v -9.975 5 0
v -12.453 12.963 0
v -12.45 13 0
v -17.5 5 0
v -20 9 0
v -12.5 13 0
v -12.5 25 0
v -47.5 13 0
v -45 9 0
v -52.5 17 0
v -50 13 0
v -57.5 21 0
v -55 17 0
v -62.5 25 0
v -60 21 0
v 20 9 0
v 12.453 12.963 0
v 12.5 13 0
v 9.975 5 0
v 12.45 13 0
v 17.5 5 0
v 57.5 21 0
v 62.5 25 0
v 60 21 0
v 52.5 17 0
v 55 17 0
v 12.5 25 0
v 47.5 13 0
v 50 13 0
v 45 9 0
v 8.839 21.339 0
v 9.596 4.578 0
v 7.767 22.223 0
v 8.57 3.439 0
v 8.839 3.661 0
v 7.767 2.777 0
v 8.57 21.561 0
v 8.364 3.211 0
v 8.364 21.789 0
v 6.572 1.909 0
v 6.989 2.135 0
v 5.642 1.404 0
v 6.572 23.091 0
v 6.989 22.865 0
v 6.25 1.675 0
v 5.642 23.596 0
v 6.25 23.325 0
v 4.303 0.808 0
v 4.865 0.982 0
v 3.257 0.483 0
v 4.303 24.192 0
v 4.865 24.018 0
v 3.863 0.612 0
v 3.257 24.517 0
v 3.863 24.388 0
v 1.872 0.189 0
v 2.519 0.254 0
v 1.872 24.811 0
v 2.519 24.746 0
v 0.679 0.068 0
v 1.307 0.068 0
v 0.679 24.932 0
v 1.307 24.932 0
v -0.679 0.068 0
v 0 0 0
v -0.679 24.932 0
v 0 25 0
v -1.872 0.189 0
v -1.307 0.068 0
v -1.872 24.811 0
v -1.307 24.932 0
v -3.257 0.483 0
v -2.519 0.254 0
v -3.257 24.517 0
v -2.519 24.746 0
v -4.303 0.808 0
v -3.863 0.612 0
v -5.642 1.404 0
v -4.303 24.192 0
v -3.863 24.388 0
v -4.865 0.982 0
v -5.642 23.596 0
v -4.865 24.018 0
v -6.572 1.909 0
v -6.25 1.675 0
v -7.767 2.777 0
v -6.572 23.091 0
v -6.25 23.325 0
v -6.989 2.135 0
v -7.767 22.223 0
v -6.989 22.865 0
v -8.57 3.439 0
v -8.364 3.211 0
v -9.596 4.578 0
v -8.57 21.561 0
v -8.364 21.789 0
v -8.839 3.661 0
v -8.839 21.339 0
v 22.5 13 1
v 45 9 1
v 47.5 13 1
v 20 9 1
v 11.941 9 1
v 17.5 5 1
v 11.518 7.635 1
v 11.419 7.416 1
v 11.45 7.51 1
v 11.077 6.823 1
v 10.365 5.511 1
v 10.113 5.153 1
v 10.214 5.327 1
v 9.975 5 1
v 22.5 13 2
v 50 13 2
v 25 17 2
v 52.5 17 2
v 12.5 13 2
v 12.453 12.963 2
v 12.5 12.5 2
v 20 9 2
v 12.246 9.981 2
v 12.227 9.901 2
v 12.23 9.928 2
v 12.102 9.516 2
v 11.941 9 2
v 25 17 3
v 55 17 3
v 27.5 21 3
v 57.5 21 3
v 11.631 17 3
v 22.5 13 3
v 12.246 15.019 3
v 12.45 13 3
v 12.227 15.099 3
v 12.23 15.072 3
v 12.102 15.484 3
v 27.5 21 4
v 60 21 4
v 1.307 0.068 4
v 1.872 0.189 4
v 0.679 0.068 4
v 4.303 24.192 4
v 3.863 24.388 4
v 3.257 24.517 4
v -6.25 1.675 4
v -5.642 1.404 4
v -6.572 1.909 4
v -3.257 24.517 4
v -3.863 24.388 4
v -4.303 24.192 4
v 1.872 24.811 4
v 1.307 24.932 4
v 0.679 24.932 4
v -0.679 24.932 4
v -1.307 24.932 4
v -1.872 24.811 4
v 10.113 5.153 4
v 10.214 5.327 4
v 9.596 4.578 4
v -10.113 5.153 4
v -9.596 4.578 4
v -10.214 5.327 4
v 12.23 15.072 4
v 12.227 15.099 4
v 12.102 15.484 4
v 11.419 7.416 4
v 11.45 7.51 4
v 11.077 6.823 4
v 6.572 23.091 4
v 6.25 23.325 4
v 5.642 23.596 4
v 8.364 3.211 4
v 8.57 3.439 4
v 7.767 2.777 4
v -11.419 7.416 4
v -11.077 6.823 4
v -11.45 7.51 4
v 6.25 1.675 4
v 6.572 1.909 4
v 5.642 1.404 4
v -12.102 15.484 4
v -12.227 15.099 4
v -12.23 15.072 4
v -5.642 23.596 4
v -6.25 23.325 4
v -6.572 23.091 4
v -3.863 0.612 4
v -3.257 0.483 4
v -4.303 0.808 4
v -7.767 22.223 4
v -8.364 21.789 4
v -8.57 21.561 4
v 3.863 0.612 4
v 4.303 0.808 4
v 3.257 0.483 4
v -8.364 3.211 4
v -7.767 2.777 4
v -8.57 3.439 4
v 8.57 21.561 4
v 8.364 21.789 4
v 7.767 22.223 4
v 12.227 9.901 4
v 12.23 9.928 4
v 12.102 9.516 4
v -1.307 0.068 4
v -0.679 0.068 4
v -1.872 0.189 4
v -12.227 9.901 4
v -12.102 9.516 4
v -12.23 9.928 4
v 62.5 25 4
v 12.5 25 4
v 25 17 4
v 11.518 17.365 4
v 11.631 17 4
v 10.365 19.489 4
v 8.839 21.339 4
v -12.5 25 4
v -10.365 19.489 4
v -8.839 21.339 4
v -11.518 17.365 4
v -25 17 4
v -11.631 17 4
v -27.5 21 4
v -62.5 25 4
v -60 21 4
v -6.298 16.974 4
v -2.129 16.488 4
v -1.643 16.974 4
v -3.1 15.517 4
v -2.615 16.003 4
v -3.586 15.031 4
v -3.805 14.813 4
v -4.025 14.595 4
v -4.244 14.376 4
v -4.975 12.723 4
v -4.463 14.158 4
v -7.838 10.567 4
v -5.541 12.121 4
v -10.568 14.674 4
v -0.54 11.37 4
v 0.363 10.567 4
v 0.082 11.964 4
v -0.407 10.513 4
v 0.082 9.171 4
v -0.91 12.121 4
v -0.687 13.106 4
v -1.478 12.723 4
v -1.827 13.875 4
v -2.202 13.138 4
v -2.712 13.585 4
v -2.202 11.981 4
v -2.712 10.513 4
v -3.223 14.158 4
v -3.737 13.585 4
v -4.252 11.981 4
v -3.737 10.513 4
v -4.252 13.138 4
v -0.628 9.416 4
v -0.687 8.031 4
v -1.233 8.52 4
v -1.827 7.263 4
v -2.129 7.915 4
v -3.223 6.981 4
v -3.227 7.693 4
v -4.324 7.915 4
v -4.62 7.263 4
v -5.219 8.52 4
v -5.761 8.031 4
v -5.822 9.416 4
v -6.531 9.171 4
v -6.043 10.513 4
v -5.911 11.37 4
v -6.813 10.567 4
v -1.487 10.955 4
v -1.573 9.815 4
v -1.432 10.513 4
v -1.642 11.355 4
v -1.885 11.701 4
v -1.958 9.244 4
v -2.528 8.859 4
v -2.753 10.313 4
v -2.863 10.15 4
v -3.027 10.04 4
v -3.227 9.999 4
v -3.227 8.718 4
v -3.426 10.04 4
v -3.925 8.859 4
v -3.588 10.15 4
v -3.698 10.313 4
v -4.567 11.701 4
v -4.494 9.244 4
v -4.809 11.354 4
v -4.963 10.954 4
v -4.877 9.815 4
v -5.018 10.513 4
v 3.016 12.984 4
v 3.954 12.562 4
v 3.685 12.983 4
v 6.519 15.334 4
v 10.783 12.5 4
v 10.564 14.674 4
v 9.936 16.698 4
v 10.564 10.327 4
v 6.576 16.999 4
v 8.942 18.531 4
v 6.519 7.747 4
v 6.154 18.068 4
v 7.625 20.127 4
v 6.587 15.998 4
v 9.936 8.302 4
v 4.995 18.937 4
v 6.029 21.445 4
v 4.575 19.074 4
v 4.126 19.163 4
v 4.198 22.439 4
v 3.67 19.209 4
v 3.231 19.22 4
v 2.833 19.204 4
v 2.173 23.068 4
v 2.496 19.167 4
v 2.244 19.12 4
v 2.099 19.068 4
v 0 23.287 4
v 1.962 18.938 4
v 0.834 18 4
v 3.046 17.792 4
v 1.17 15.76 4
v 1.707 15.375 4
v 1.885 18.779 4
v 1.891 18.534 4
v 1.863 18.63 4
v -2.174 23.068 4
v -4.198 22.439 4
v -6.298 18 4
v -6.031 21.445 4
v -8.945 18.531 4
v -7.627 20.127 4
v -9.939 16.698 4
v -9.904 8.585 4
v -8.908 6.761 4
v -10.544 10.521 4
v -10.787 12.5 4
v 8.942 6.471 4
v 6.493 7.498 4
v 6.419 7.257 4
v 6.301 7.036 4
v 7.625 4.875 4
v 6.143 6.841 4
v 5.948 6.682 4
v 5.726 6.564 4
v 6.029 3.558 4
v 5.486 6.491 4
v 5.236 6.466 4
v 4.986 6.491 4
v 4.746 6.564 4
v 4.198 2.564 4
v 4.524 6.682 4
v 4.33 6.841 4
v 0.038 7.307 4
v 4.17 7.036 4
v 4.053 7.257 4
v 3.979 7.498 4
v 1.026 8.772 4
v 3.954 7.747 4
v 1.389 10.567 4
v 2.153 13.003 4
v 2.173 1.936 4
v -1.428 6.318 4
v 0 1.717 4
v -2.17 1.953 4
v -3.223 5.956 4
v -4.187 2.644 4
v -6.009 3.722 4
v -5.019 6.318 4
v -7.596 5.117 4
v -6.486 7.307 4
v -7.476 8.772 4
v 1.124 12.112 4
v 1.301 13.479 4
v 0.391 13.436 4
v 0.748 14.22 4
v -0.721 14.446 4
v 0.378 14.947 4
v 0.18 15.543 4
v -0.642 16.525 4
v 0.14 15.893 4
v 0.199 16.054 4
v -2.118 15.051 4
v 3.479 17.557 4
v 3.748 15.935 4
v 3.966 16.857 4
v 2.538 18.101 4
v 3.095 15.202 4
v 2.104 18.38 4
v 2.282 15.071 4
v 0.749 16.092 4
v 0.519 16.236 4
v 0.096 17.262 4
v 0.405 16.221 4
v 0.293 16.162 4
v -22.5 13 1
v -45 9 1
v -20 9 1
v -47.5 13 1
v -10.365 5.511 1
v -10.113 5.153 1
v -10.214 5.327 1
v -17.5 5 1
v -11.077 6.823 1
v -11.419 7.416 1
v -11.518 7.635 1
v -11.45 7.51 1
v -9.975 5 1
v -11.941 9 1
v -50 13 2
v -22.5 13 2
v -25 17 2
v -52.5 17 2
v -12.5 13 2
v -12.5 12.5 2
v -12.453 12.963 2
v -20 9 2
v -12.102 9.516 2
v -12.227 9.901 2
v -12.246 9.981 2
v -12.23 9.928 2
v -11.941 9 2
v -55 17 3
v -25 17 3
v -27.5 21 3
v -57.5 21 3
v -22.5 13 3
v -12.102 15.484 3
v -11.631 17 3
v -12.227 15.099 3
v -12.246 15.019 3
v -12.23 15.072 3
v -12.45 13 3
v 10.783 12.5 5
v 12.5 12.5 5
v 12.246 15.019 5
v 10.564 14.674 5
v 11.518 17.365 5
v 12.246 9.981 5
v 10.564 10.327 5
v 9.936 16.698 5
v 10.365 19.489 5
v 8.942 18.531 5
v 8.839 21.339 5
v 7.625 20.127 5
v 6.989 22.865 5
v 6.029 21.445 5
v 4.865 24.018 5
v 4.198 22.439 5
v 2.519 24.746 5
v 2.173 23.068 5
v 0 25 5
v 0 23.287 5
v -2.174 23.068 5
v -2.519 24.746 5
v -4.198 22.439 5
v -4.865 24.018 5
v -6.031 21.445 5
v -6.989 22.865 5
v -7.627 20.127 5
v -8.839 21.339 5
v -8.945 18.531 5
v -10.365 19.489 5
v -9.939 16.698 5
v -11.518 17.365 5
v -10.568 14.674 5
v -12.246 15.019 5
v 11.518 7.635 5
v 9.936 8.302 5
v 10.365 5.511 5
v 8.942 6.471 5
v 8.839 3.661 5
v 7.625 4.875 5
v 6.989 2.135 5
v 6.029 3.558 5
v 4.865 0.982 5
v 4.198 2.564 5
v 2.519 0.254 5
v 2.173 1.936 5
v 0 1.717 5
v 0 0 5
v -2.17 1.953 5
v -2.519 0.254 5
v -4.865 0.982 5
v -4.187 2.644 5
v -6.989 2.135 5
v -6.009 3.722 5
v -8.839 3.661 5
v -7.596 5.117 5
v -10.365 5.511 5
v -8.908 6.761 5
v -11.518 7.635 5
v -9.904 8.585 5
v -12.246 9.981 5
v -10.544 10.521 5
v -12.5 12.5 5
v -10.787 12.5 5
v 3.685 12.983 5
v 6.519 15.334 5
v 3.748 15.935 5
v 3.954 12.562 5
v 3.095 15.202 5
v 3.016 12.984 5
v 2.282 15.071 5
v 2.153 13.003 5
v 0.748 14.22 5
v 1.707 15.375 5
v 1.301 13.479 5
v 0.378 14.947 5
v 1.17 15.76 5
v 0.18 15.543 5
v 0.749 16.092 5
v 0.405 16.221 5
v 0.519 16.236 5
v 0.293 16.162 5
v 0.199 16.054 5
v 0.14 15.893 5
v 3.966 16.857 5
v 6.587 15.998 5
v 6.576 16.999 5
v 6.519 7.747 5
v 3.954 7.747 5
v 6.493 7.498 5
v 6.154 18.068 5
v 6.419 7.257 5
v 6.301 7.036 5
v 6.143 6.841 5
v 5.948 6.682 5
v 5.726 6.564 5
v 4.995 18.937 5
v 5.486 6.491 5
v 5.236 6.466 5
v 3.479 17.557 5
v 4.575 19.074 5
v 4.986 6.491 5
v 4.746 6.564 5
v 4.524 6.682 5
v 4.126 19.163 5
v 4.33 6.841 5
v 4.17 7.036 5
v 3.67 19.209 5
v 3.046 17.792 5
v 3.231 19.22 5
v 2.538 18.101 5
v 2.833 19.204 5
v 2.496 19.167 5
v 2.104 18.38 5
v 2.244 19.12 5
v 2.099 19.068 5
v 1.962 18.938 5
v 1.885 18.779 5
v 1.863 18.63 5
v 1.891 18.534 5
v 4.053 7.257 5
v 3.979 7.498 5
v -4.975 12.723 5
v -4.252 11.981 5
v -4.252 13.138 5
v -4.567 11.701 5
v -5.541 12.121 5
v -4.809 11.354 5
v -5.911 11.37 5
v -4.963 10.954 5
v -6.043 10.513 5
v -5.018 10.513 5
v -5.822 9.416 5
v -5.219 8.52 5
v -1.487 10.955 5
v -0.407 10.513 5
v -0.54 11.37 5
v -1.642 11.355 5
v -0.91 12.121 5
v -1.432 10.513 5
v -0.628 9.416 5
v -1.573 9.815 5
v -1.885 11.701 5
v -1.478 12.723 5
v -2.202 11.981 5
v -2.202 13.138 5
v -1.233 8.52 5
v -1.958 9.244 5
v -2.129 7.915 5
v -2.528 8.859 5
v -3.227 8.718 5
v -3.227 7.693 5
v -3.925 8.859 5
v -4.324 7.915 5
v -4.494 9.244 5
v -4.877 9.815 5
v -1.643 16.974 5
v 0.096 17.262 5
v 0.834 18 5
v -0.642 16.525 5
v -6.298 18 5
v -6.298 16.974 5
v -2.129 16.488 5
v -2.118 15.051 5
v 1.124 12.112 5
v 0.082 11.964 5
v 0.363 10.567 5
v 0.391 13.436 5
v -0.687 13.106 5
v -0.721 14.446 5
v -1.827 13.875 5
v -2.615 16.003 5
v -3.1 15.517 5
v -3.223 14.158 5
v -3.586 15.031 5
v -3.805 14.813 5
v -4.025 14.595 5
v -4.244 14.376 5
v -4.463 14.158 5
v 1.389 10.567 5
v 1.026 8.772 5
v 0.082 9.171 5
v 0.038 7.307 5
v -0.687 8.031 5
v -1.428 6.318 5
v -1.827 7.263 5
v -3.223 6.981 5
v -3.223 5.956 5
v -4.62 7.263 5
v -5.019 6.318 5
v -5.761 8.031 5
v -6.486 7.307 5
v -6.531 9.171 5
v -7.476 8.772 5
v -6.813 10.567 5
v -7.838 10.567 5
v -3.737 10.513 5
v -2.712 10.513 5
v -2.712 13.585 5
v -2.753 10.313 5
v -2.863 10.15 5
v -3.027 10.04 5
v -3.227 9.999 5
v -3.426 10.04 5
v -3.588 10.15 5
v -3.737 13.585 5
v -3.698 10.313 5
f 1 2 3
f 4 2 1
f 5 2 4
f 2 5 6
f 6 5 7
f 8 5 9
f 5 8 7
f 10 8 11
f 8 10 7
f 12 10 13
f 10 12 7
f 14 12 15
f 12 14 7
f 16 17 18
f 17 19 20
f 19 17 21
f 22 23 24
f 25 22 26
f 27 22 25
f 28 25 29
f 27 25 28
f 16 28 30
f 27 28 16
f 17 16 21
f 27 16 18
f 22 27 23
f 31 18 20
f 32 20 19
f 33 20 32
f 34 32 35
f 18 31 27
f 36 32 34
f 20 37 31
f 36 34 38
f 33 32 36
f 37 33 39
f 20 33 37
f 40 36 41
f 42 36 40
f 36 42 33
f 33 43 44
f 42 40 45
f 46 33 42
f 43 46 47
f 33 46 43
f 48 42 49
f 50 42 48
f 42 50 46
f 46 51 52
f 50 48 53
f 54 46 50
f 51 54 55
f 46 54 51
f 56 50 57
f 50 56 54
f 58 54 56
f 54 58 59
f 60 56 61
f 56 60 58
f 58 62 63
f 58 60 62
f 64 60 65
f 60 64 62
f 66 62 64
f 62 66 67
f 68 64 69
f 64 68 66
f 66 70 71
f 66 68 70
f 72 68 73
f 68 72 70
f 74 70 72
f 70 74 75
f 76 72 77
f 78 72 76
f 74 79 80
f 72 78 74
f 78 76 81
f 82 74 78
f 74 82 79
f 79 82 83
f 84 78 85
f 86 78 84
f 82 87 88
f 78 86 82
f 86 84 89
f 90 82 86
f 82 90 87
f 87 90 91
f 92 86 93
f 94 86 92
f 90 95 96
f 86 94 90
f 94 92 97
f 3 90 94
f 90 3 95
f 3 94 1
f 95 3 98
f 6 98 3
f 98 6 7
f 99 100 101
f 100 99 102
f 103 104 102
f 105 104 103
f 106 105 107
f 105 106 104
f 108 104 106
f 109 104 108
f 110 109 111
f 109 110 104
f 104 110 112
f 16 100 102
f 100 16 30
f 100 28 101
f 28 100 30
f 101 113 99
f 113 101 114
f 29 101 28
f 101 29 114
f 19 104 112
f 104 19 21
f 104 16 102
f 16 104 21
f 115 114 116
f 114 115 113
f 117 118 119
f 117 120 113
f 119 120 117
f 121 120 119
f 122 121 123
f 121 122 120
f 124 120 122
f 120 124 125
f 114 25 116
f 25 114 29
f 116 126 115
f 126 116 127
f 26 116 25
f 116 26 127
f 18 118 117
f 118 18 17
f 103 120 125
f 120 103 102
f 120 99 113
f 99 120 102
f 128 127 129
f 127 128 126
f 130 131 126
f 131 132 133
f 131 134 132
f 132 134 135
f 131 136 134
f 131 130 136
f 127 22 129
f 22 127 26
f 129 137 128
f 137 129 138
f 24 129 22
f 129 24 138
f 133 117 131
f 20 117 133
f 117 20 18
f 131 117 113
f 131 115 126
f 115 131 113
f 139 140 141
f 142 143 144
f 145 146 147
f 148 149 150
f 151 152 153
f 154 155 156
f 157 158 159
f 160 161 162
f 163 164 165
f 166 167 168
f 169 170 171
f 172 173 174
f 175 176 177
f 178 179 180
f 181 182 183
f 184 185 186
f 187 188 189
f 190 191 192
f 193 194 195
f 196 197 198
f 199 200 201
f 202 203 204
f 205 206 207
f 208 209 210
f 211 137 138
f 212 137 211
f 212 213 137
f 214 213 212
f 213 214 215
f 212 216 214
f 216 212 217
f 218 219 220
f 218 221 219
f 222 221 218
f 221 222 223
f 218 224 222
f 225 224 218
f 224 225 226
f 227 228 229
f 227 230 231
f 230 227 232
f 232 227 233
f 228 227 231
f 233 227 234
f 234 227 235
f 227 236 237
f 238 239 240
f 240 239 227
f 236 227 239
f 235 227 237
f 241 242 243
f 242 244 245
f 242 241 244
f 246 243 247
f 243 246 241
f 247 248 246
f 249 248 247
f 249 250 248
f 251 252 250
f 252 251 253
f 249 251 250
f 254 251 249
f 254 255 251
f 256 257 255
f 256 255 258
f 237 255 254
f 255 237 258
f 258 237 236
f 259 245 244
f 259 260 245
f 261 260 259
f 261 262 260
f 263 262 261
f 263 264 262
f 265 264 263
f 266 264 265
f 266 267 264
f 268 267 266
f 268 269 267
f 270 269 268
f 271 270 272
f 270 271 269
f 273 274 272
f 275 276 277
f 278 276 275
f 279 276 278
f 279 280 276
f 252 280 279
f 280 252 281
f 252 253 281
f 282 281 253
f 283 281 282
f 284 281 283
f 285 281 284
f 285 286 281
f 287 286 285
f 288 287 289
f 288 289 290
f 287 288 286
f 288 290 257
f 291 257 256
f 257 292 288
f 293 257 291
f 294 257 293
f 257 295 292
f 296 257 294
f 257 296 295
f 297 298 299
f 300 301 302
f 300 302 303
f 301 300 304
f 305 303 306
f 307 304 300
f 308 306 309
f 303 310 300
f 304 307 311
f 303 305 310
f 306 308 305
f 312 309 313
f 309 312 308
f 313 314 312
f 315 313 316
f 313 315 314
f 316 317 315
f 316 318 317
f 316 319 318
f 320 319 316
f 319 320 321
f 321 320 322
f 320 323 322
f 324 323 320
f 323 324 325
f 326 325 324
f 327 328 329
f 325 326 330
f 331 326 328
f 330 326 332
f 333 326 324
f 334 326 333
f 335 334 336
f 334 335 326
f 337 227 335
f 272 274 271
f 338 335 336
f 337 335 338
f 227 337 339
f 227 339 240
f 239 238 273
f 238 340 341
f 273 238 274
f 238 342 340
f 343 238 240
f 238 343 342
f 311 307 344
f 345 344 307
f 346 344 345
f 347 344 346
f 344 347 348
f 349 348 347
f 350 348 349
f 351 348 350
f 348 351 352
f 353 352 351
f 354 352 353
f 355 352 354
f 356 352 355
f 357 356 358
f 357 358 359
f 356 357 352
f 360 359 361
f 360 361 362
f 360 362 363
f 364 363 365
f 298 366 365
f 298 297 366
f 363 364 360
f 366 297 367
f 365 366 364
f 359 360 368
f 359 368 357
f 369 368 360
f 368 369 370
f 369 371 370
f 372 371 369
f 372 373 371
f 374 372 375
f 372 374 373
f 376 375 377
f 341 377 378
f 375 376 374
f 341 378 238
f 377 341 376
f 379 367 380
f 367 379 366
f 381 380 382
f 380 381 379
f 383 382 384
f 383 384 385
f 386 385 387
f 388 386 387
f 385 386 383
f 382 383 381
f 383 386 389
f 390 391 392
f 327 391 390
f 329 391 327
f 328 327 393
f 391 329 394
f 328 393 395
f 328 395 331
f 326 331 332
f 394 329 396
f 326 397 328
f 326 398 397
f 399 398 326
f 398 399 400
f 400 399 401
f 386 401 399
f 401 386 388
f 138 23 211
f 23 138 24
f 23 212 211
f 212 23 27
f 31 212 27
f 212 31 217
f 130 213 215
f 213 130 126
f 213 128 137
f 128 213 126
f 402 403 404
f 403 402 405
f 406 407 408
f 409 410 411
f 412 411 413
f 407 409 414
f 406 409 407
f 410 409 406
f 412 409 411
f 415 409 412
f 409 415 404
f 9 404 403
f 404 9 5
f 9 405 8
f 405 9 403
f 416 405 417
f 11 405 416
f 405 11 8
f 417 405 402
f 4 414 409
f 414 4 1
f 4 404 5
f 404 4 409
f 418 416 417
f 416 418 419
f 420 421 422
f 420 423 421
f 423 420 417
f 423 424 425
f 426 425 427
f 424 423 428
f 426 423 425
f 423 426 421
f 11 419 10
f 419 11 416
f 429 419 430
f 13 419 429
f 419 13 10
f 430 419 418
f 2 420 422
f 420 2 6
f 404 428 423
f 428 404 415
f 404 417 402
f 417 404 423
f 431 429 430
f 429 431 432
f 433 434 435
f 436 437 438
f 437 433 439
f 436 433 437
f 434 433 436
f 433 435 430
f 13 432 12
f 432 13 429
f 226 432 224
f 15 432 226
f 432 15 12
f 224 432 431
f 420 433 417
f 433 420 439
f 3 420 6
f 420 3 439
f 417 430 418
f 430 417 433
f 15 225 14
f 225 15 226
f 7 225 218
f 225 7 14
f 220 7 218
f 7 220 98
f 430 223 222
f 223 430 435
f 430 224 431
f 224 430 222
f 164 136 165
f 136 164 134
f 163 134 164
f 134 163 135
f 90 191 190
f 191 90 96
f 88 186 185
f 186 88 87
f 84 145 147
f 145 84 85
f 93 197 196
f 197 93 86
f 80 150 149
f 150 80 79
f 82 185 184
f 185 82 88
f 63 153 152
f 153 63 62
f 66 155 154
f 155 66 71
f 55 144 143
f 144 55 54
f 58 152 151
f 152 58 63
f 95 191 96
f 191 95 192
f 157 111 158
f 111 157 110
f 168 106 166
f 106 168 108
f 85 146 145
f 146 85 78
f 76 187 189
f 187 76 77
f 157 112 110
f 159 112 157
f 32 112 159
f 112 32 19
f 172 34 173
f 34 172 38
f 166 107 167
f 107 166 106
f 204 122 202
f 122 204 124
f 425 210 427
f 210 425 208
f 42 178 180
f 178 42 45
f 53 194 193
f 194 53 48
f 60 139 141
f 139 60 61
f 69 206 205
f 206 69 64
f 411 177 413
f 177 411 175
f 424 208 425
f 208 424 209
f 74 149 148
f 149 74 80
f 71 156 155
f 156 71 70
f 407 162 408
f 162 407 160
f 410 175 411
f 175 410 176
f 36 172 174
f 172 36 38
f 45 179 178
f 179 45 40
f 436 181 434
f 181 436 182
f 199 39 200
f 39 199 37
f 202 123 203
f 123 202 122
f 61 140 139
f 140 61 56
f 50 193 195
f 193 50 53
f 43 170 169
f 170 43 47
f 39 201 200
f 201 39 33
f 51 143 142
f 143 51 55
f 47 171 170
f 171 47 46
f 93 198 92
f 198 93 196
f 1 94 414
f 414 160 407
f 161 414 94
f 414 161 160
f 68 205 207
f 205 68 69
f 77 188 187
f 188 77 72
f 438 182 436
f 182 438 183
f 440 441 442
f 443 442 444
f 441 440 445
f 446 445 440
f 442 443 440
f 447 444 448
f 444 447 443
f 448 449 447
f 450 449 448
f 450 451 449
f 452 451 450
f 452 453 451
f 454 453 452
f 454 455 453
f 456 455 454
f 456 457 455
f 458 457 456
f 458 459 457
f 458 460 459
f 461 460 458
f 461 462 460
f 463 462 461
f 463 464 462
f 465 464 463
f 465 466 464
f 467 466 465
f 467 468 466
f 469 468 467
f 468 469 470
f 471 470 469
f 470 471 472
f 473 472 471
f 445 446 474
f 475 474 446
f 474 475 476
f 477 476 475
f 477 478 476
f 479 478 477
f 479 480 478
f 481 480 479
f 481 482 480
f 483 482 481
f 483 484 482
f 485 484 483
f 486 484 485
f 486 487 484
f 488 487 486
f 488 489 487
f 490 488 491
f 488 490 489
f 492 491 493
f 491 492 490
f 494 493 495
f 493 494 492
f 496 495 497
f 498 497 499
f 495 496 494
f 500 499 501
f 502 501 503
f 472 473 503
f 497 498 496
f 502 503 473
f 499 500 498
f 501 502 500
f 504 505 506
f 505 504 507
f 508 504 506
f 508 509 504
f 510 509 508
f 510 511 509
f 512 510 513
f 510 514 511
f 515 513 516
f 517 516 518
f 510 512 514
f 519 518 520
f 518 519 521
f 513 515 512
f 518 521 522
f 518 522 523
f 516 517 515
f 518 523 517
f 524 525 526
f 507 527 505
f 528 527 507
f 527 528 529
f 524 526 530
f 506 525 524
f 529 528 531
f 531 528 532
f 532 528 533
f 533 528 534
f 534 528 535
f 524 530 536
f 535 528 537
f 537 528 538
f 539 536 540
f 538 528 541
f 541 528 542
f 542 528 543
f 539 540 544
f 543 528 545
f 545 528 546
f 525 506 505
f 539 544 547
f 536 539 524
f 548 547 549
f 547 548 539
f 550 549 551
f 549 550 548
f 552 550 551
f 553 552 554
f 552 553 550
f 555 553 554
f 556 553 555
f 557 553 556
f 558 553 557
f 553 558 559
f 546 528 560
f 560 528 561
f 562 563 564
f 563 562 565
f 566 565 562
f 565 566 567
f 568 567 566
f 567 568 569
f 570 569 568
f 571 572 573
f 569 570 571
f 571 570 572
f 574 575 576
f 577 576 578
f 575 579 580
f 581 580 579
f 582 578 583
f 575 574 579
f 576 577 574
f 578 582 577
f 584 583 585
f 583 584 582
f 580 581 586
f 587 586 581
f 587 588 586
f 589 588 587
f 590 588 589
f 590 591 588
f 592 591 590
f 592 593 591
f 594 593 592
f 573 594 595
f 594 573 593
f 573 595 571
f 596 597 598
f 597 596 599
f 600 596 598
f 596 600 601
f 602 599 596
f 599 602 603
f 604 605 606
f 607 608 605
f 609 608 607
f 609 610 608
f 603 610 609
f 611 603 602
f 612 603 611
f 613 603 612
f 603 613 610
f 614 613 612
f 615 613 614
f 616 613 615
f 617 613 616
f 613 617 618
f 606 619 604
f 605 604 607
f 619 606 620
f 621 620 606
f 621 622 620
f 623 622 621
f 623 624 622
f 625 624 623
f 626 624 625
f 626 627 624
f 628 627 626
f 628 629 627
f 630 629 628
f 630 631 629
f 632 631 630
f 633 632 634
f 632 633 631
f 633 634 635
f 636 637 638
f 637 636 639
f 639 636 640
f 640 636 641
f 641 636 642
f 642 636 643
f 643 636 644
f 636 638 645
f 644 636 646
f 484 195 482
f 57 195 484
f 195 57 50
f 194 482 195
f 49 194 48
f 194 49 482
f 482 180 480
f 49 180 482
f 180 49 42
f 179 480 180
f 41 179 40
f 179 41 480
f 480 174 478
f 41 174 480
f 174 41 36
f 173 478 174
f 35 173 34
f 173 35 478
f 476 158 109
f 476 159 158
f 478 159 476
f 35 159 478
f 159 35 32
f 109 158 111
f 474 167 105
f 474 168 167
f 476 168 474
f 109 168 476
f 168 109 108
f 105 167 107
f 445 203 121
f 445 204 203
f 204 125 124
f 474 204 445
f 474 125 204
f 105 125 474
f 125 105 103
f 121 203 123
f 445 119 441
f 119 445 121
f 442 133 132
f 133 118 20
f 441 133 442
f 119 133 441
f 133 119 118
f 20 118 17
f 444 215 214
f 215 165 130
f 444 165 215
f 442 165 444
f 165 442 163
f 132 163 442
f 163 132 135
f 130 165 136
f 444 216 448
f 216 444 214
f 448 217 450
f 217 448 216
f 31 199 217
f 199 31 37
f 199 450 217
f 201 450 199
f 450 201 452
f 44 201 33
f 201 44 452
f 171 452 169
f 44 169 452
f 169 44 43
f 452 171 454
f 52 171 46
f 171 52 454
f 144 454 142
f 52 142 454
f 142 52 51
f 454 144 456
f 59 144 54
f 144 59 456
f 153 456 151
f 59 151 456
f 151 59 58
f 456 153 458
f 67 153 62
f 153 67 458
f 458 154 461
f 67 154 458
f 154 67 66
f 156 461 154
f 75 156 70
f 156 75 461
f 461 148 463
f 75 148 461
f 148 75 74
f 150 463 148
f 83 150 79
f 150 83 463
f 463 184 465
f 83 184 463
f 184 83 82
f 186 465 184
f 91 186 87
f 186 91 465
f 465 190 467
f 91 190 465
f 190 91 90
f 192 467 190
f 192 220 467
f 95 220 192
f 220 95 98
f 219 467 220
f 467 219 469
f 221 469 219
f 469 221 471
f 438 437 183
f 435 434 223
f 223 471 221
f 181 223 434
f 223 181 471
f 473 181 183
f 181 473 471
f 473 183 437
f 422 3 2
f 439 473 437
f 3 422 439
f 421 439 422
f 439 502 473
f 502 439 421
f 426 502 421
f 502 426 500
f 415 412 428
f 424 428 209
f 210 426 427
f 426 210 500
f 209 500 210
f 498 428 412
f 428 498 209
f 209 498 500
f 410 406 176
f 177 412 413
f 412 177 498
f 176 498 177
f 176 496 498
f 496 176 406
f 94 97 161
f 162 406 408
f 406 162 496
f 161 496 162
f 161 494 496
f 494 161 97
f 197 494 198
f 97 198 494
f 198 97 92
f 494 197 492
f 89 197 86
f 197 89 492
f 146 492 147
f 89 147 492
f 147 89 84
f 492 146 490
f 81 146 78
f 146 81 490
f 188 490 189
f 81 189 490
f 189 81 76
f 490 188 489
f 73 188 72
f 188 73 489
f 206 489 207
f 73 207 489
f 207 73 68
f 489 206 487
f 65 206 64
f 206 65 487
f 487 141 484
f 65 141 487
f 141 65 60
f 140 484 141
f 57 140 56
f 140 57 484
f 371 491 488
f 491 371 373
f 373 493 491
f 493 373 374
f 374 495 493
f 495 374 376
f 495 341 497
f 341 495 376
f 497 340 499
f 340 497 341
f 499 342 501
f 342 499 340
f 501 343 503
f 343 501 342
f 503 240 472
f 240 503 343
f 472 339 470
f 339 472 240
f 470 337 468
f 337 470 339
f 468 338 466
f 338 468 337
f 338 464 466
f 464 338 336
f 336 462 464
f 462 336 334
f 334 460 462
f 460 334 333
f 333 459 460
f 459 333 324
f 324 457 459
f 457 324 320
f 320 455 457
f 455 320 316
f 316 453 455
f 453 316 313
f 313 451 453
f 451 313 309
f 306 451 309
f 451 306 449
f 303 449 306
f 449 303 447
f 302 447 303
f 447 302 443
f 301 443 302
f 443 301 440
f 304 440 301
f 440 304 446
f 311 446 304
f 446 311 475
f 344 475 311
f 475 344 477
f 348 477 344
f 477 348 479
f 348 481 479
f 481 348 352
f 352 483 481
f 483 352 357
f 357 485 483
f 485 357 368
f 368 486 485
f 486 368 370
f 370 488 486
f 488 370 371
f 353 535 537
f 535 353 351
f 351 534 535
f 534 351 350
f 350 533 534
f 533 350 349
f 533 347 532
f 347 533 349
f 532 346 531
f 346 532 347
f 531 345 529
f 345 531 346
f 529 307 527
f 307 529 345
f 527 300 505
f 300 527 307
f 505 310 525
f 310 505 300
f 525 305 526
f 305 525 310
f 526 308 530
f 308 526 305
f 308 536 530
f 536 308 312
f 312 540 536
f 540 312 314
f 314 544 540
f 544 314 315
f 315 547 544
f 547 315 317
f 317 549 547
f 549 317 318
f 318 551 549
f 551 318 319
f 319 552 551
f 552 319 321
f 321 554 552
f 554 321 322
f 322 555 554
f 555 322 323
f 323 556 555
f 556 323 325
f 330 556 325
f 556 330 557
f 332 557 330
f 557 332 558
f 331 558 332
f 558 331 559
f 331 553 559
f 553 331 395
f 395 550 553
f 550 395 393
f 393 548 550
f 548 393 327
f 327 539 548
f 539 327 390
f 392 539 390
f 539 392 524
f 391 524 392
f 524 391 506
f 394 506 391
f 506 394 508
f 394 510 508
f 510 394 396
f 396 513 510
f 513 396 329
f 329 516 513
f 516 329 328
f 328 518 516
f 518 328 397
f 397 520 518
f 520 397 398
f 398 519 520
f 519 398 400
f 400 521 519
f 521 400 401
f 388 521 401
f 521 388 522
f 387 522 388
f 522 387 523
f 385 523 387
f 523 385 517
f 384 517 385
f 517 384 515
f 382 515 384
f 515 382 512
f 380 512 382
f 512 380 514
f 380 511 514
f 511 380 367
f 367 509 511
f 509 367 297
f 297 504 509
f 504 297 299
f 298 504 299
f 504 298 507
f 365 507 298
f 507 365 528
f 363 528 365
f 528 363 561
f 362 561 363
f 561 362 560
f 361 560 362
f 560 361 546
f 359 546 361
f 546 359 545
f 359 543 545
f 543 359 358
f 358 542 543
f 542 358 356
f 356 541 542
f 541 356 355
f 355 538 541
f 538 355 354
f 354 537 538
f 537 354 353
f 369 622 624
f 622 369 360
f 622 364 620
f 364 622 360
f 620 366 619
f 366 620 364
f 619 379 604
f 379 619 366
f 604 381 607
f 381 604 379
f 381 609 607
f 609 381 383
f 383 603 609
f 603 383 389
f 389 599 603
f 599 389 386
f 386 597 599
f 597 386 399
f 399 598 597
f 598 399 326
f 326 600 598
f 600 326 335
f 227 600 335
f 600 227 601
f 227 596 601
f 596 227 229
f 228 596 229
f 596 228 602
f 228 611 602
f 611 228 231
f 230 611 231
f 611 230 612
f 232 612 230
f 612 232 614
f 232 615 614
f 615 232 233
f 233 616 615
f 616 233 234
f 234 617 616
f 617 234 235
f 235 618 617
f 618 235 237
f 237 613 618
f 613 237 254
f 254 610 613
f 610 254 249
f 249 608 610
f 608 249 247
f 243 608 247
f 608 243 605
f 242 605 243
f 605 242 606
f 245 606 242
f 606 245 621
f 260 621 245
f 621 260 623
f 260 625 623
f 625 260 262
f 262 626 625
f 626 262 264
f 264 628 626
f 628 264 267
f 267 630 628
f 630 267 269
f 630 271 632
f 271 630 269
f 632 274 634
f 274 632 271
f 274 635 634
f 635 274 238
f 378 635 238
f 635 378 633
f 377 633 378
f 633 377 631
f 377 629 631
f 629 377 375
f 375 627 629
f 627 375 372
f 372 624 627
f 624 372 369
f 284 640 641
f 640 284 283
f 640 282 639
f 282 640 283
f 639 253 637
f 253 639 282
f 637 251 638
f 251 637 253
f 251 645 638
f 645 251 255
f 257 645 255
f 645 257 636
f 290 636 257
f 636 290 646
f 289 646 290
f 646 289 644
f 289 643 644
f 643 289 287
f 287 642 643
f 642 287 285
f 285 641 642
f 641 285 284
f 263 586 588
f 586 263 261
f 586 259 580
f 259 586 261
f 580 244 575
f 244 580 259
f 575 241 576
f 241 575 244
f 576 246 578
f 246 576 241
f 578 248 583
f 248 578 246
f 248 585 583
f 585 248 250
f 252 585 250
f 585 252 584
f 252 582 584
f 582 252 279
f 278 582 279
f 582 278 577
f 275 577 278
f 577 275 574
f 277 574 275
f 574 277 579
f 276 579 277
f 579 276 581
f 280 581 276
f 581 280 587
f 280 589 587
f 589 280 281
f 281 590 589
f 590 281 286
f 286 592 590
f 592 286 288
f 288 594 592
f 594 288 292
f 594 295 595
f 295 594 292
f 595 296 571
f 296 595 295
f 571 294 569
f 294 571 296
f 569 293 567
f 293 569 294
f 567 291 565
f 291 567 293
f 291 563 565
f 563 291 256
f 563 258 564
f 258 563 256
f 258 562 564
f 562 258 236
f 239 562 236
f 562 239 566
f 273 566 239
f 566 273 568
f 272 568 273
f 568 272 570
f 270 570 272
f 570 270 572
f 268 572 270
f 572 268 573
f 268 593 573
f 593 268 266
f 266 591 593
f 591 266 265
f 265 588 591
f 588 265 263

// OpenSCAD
module wings(){
	linear_extrude(height = 2, center = false, convexity = 10, twist = 0)
	polygon([[10,10],[35,10],[40,18],[90,18],[95,26],[45,26],[20,18]]);
	linear_extrude(height = 4, center = false, convexity = 10, twist = 0)
	polygon([[15,18],[40,18],[45,26],[100,26],[105,34],[50,34],[25,26]]);
	linear_extrude(height = 6, center = false, convexity = 10, twist = 0)
	polygon([[20,26],[45,26],[50,34],[110,34],[115,42],[55,42],[20,34]]);
	linear_extrude(height = 8, center = false, convexity = 10, twist = 0)
	polygon([[20,34],[50,34],[55,42],[120,42],[125,50],[25,50],[17,42]]);
}

module badge() {
	wings();
	mirror() wings();
	translate([0,25,0])
	cylinder(h=8,r=25);
	linear_extrude(height = 10, center = false, convexity = 10, twist = 0)
	translate([-25,0,0])
	import("n39_logo_50mm.dxf");
}

scale(0.5)badge();
